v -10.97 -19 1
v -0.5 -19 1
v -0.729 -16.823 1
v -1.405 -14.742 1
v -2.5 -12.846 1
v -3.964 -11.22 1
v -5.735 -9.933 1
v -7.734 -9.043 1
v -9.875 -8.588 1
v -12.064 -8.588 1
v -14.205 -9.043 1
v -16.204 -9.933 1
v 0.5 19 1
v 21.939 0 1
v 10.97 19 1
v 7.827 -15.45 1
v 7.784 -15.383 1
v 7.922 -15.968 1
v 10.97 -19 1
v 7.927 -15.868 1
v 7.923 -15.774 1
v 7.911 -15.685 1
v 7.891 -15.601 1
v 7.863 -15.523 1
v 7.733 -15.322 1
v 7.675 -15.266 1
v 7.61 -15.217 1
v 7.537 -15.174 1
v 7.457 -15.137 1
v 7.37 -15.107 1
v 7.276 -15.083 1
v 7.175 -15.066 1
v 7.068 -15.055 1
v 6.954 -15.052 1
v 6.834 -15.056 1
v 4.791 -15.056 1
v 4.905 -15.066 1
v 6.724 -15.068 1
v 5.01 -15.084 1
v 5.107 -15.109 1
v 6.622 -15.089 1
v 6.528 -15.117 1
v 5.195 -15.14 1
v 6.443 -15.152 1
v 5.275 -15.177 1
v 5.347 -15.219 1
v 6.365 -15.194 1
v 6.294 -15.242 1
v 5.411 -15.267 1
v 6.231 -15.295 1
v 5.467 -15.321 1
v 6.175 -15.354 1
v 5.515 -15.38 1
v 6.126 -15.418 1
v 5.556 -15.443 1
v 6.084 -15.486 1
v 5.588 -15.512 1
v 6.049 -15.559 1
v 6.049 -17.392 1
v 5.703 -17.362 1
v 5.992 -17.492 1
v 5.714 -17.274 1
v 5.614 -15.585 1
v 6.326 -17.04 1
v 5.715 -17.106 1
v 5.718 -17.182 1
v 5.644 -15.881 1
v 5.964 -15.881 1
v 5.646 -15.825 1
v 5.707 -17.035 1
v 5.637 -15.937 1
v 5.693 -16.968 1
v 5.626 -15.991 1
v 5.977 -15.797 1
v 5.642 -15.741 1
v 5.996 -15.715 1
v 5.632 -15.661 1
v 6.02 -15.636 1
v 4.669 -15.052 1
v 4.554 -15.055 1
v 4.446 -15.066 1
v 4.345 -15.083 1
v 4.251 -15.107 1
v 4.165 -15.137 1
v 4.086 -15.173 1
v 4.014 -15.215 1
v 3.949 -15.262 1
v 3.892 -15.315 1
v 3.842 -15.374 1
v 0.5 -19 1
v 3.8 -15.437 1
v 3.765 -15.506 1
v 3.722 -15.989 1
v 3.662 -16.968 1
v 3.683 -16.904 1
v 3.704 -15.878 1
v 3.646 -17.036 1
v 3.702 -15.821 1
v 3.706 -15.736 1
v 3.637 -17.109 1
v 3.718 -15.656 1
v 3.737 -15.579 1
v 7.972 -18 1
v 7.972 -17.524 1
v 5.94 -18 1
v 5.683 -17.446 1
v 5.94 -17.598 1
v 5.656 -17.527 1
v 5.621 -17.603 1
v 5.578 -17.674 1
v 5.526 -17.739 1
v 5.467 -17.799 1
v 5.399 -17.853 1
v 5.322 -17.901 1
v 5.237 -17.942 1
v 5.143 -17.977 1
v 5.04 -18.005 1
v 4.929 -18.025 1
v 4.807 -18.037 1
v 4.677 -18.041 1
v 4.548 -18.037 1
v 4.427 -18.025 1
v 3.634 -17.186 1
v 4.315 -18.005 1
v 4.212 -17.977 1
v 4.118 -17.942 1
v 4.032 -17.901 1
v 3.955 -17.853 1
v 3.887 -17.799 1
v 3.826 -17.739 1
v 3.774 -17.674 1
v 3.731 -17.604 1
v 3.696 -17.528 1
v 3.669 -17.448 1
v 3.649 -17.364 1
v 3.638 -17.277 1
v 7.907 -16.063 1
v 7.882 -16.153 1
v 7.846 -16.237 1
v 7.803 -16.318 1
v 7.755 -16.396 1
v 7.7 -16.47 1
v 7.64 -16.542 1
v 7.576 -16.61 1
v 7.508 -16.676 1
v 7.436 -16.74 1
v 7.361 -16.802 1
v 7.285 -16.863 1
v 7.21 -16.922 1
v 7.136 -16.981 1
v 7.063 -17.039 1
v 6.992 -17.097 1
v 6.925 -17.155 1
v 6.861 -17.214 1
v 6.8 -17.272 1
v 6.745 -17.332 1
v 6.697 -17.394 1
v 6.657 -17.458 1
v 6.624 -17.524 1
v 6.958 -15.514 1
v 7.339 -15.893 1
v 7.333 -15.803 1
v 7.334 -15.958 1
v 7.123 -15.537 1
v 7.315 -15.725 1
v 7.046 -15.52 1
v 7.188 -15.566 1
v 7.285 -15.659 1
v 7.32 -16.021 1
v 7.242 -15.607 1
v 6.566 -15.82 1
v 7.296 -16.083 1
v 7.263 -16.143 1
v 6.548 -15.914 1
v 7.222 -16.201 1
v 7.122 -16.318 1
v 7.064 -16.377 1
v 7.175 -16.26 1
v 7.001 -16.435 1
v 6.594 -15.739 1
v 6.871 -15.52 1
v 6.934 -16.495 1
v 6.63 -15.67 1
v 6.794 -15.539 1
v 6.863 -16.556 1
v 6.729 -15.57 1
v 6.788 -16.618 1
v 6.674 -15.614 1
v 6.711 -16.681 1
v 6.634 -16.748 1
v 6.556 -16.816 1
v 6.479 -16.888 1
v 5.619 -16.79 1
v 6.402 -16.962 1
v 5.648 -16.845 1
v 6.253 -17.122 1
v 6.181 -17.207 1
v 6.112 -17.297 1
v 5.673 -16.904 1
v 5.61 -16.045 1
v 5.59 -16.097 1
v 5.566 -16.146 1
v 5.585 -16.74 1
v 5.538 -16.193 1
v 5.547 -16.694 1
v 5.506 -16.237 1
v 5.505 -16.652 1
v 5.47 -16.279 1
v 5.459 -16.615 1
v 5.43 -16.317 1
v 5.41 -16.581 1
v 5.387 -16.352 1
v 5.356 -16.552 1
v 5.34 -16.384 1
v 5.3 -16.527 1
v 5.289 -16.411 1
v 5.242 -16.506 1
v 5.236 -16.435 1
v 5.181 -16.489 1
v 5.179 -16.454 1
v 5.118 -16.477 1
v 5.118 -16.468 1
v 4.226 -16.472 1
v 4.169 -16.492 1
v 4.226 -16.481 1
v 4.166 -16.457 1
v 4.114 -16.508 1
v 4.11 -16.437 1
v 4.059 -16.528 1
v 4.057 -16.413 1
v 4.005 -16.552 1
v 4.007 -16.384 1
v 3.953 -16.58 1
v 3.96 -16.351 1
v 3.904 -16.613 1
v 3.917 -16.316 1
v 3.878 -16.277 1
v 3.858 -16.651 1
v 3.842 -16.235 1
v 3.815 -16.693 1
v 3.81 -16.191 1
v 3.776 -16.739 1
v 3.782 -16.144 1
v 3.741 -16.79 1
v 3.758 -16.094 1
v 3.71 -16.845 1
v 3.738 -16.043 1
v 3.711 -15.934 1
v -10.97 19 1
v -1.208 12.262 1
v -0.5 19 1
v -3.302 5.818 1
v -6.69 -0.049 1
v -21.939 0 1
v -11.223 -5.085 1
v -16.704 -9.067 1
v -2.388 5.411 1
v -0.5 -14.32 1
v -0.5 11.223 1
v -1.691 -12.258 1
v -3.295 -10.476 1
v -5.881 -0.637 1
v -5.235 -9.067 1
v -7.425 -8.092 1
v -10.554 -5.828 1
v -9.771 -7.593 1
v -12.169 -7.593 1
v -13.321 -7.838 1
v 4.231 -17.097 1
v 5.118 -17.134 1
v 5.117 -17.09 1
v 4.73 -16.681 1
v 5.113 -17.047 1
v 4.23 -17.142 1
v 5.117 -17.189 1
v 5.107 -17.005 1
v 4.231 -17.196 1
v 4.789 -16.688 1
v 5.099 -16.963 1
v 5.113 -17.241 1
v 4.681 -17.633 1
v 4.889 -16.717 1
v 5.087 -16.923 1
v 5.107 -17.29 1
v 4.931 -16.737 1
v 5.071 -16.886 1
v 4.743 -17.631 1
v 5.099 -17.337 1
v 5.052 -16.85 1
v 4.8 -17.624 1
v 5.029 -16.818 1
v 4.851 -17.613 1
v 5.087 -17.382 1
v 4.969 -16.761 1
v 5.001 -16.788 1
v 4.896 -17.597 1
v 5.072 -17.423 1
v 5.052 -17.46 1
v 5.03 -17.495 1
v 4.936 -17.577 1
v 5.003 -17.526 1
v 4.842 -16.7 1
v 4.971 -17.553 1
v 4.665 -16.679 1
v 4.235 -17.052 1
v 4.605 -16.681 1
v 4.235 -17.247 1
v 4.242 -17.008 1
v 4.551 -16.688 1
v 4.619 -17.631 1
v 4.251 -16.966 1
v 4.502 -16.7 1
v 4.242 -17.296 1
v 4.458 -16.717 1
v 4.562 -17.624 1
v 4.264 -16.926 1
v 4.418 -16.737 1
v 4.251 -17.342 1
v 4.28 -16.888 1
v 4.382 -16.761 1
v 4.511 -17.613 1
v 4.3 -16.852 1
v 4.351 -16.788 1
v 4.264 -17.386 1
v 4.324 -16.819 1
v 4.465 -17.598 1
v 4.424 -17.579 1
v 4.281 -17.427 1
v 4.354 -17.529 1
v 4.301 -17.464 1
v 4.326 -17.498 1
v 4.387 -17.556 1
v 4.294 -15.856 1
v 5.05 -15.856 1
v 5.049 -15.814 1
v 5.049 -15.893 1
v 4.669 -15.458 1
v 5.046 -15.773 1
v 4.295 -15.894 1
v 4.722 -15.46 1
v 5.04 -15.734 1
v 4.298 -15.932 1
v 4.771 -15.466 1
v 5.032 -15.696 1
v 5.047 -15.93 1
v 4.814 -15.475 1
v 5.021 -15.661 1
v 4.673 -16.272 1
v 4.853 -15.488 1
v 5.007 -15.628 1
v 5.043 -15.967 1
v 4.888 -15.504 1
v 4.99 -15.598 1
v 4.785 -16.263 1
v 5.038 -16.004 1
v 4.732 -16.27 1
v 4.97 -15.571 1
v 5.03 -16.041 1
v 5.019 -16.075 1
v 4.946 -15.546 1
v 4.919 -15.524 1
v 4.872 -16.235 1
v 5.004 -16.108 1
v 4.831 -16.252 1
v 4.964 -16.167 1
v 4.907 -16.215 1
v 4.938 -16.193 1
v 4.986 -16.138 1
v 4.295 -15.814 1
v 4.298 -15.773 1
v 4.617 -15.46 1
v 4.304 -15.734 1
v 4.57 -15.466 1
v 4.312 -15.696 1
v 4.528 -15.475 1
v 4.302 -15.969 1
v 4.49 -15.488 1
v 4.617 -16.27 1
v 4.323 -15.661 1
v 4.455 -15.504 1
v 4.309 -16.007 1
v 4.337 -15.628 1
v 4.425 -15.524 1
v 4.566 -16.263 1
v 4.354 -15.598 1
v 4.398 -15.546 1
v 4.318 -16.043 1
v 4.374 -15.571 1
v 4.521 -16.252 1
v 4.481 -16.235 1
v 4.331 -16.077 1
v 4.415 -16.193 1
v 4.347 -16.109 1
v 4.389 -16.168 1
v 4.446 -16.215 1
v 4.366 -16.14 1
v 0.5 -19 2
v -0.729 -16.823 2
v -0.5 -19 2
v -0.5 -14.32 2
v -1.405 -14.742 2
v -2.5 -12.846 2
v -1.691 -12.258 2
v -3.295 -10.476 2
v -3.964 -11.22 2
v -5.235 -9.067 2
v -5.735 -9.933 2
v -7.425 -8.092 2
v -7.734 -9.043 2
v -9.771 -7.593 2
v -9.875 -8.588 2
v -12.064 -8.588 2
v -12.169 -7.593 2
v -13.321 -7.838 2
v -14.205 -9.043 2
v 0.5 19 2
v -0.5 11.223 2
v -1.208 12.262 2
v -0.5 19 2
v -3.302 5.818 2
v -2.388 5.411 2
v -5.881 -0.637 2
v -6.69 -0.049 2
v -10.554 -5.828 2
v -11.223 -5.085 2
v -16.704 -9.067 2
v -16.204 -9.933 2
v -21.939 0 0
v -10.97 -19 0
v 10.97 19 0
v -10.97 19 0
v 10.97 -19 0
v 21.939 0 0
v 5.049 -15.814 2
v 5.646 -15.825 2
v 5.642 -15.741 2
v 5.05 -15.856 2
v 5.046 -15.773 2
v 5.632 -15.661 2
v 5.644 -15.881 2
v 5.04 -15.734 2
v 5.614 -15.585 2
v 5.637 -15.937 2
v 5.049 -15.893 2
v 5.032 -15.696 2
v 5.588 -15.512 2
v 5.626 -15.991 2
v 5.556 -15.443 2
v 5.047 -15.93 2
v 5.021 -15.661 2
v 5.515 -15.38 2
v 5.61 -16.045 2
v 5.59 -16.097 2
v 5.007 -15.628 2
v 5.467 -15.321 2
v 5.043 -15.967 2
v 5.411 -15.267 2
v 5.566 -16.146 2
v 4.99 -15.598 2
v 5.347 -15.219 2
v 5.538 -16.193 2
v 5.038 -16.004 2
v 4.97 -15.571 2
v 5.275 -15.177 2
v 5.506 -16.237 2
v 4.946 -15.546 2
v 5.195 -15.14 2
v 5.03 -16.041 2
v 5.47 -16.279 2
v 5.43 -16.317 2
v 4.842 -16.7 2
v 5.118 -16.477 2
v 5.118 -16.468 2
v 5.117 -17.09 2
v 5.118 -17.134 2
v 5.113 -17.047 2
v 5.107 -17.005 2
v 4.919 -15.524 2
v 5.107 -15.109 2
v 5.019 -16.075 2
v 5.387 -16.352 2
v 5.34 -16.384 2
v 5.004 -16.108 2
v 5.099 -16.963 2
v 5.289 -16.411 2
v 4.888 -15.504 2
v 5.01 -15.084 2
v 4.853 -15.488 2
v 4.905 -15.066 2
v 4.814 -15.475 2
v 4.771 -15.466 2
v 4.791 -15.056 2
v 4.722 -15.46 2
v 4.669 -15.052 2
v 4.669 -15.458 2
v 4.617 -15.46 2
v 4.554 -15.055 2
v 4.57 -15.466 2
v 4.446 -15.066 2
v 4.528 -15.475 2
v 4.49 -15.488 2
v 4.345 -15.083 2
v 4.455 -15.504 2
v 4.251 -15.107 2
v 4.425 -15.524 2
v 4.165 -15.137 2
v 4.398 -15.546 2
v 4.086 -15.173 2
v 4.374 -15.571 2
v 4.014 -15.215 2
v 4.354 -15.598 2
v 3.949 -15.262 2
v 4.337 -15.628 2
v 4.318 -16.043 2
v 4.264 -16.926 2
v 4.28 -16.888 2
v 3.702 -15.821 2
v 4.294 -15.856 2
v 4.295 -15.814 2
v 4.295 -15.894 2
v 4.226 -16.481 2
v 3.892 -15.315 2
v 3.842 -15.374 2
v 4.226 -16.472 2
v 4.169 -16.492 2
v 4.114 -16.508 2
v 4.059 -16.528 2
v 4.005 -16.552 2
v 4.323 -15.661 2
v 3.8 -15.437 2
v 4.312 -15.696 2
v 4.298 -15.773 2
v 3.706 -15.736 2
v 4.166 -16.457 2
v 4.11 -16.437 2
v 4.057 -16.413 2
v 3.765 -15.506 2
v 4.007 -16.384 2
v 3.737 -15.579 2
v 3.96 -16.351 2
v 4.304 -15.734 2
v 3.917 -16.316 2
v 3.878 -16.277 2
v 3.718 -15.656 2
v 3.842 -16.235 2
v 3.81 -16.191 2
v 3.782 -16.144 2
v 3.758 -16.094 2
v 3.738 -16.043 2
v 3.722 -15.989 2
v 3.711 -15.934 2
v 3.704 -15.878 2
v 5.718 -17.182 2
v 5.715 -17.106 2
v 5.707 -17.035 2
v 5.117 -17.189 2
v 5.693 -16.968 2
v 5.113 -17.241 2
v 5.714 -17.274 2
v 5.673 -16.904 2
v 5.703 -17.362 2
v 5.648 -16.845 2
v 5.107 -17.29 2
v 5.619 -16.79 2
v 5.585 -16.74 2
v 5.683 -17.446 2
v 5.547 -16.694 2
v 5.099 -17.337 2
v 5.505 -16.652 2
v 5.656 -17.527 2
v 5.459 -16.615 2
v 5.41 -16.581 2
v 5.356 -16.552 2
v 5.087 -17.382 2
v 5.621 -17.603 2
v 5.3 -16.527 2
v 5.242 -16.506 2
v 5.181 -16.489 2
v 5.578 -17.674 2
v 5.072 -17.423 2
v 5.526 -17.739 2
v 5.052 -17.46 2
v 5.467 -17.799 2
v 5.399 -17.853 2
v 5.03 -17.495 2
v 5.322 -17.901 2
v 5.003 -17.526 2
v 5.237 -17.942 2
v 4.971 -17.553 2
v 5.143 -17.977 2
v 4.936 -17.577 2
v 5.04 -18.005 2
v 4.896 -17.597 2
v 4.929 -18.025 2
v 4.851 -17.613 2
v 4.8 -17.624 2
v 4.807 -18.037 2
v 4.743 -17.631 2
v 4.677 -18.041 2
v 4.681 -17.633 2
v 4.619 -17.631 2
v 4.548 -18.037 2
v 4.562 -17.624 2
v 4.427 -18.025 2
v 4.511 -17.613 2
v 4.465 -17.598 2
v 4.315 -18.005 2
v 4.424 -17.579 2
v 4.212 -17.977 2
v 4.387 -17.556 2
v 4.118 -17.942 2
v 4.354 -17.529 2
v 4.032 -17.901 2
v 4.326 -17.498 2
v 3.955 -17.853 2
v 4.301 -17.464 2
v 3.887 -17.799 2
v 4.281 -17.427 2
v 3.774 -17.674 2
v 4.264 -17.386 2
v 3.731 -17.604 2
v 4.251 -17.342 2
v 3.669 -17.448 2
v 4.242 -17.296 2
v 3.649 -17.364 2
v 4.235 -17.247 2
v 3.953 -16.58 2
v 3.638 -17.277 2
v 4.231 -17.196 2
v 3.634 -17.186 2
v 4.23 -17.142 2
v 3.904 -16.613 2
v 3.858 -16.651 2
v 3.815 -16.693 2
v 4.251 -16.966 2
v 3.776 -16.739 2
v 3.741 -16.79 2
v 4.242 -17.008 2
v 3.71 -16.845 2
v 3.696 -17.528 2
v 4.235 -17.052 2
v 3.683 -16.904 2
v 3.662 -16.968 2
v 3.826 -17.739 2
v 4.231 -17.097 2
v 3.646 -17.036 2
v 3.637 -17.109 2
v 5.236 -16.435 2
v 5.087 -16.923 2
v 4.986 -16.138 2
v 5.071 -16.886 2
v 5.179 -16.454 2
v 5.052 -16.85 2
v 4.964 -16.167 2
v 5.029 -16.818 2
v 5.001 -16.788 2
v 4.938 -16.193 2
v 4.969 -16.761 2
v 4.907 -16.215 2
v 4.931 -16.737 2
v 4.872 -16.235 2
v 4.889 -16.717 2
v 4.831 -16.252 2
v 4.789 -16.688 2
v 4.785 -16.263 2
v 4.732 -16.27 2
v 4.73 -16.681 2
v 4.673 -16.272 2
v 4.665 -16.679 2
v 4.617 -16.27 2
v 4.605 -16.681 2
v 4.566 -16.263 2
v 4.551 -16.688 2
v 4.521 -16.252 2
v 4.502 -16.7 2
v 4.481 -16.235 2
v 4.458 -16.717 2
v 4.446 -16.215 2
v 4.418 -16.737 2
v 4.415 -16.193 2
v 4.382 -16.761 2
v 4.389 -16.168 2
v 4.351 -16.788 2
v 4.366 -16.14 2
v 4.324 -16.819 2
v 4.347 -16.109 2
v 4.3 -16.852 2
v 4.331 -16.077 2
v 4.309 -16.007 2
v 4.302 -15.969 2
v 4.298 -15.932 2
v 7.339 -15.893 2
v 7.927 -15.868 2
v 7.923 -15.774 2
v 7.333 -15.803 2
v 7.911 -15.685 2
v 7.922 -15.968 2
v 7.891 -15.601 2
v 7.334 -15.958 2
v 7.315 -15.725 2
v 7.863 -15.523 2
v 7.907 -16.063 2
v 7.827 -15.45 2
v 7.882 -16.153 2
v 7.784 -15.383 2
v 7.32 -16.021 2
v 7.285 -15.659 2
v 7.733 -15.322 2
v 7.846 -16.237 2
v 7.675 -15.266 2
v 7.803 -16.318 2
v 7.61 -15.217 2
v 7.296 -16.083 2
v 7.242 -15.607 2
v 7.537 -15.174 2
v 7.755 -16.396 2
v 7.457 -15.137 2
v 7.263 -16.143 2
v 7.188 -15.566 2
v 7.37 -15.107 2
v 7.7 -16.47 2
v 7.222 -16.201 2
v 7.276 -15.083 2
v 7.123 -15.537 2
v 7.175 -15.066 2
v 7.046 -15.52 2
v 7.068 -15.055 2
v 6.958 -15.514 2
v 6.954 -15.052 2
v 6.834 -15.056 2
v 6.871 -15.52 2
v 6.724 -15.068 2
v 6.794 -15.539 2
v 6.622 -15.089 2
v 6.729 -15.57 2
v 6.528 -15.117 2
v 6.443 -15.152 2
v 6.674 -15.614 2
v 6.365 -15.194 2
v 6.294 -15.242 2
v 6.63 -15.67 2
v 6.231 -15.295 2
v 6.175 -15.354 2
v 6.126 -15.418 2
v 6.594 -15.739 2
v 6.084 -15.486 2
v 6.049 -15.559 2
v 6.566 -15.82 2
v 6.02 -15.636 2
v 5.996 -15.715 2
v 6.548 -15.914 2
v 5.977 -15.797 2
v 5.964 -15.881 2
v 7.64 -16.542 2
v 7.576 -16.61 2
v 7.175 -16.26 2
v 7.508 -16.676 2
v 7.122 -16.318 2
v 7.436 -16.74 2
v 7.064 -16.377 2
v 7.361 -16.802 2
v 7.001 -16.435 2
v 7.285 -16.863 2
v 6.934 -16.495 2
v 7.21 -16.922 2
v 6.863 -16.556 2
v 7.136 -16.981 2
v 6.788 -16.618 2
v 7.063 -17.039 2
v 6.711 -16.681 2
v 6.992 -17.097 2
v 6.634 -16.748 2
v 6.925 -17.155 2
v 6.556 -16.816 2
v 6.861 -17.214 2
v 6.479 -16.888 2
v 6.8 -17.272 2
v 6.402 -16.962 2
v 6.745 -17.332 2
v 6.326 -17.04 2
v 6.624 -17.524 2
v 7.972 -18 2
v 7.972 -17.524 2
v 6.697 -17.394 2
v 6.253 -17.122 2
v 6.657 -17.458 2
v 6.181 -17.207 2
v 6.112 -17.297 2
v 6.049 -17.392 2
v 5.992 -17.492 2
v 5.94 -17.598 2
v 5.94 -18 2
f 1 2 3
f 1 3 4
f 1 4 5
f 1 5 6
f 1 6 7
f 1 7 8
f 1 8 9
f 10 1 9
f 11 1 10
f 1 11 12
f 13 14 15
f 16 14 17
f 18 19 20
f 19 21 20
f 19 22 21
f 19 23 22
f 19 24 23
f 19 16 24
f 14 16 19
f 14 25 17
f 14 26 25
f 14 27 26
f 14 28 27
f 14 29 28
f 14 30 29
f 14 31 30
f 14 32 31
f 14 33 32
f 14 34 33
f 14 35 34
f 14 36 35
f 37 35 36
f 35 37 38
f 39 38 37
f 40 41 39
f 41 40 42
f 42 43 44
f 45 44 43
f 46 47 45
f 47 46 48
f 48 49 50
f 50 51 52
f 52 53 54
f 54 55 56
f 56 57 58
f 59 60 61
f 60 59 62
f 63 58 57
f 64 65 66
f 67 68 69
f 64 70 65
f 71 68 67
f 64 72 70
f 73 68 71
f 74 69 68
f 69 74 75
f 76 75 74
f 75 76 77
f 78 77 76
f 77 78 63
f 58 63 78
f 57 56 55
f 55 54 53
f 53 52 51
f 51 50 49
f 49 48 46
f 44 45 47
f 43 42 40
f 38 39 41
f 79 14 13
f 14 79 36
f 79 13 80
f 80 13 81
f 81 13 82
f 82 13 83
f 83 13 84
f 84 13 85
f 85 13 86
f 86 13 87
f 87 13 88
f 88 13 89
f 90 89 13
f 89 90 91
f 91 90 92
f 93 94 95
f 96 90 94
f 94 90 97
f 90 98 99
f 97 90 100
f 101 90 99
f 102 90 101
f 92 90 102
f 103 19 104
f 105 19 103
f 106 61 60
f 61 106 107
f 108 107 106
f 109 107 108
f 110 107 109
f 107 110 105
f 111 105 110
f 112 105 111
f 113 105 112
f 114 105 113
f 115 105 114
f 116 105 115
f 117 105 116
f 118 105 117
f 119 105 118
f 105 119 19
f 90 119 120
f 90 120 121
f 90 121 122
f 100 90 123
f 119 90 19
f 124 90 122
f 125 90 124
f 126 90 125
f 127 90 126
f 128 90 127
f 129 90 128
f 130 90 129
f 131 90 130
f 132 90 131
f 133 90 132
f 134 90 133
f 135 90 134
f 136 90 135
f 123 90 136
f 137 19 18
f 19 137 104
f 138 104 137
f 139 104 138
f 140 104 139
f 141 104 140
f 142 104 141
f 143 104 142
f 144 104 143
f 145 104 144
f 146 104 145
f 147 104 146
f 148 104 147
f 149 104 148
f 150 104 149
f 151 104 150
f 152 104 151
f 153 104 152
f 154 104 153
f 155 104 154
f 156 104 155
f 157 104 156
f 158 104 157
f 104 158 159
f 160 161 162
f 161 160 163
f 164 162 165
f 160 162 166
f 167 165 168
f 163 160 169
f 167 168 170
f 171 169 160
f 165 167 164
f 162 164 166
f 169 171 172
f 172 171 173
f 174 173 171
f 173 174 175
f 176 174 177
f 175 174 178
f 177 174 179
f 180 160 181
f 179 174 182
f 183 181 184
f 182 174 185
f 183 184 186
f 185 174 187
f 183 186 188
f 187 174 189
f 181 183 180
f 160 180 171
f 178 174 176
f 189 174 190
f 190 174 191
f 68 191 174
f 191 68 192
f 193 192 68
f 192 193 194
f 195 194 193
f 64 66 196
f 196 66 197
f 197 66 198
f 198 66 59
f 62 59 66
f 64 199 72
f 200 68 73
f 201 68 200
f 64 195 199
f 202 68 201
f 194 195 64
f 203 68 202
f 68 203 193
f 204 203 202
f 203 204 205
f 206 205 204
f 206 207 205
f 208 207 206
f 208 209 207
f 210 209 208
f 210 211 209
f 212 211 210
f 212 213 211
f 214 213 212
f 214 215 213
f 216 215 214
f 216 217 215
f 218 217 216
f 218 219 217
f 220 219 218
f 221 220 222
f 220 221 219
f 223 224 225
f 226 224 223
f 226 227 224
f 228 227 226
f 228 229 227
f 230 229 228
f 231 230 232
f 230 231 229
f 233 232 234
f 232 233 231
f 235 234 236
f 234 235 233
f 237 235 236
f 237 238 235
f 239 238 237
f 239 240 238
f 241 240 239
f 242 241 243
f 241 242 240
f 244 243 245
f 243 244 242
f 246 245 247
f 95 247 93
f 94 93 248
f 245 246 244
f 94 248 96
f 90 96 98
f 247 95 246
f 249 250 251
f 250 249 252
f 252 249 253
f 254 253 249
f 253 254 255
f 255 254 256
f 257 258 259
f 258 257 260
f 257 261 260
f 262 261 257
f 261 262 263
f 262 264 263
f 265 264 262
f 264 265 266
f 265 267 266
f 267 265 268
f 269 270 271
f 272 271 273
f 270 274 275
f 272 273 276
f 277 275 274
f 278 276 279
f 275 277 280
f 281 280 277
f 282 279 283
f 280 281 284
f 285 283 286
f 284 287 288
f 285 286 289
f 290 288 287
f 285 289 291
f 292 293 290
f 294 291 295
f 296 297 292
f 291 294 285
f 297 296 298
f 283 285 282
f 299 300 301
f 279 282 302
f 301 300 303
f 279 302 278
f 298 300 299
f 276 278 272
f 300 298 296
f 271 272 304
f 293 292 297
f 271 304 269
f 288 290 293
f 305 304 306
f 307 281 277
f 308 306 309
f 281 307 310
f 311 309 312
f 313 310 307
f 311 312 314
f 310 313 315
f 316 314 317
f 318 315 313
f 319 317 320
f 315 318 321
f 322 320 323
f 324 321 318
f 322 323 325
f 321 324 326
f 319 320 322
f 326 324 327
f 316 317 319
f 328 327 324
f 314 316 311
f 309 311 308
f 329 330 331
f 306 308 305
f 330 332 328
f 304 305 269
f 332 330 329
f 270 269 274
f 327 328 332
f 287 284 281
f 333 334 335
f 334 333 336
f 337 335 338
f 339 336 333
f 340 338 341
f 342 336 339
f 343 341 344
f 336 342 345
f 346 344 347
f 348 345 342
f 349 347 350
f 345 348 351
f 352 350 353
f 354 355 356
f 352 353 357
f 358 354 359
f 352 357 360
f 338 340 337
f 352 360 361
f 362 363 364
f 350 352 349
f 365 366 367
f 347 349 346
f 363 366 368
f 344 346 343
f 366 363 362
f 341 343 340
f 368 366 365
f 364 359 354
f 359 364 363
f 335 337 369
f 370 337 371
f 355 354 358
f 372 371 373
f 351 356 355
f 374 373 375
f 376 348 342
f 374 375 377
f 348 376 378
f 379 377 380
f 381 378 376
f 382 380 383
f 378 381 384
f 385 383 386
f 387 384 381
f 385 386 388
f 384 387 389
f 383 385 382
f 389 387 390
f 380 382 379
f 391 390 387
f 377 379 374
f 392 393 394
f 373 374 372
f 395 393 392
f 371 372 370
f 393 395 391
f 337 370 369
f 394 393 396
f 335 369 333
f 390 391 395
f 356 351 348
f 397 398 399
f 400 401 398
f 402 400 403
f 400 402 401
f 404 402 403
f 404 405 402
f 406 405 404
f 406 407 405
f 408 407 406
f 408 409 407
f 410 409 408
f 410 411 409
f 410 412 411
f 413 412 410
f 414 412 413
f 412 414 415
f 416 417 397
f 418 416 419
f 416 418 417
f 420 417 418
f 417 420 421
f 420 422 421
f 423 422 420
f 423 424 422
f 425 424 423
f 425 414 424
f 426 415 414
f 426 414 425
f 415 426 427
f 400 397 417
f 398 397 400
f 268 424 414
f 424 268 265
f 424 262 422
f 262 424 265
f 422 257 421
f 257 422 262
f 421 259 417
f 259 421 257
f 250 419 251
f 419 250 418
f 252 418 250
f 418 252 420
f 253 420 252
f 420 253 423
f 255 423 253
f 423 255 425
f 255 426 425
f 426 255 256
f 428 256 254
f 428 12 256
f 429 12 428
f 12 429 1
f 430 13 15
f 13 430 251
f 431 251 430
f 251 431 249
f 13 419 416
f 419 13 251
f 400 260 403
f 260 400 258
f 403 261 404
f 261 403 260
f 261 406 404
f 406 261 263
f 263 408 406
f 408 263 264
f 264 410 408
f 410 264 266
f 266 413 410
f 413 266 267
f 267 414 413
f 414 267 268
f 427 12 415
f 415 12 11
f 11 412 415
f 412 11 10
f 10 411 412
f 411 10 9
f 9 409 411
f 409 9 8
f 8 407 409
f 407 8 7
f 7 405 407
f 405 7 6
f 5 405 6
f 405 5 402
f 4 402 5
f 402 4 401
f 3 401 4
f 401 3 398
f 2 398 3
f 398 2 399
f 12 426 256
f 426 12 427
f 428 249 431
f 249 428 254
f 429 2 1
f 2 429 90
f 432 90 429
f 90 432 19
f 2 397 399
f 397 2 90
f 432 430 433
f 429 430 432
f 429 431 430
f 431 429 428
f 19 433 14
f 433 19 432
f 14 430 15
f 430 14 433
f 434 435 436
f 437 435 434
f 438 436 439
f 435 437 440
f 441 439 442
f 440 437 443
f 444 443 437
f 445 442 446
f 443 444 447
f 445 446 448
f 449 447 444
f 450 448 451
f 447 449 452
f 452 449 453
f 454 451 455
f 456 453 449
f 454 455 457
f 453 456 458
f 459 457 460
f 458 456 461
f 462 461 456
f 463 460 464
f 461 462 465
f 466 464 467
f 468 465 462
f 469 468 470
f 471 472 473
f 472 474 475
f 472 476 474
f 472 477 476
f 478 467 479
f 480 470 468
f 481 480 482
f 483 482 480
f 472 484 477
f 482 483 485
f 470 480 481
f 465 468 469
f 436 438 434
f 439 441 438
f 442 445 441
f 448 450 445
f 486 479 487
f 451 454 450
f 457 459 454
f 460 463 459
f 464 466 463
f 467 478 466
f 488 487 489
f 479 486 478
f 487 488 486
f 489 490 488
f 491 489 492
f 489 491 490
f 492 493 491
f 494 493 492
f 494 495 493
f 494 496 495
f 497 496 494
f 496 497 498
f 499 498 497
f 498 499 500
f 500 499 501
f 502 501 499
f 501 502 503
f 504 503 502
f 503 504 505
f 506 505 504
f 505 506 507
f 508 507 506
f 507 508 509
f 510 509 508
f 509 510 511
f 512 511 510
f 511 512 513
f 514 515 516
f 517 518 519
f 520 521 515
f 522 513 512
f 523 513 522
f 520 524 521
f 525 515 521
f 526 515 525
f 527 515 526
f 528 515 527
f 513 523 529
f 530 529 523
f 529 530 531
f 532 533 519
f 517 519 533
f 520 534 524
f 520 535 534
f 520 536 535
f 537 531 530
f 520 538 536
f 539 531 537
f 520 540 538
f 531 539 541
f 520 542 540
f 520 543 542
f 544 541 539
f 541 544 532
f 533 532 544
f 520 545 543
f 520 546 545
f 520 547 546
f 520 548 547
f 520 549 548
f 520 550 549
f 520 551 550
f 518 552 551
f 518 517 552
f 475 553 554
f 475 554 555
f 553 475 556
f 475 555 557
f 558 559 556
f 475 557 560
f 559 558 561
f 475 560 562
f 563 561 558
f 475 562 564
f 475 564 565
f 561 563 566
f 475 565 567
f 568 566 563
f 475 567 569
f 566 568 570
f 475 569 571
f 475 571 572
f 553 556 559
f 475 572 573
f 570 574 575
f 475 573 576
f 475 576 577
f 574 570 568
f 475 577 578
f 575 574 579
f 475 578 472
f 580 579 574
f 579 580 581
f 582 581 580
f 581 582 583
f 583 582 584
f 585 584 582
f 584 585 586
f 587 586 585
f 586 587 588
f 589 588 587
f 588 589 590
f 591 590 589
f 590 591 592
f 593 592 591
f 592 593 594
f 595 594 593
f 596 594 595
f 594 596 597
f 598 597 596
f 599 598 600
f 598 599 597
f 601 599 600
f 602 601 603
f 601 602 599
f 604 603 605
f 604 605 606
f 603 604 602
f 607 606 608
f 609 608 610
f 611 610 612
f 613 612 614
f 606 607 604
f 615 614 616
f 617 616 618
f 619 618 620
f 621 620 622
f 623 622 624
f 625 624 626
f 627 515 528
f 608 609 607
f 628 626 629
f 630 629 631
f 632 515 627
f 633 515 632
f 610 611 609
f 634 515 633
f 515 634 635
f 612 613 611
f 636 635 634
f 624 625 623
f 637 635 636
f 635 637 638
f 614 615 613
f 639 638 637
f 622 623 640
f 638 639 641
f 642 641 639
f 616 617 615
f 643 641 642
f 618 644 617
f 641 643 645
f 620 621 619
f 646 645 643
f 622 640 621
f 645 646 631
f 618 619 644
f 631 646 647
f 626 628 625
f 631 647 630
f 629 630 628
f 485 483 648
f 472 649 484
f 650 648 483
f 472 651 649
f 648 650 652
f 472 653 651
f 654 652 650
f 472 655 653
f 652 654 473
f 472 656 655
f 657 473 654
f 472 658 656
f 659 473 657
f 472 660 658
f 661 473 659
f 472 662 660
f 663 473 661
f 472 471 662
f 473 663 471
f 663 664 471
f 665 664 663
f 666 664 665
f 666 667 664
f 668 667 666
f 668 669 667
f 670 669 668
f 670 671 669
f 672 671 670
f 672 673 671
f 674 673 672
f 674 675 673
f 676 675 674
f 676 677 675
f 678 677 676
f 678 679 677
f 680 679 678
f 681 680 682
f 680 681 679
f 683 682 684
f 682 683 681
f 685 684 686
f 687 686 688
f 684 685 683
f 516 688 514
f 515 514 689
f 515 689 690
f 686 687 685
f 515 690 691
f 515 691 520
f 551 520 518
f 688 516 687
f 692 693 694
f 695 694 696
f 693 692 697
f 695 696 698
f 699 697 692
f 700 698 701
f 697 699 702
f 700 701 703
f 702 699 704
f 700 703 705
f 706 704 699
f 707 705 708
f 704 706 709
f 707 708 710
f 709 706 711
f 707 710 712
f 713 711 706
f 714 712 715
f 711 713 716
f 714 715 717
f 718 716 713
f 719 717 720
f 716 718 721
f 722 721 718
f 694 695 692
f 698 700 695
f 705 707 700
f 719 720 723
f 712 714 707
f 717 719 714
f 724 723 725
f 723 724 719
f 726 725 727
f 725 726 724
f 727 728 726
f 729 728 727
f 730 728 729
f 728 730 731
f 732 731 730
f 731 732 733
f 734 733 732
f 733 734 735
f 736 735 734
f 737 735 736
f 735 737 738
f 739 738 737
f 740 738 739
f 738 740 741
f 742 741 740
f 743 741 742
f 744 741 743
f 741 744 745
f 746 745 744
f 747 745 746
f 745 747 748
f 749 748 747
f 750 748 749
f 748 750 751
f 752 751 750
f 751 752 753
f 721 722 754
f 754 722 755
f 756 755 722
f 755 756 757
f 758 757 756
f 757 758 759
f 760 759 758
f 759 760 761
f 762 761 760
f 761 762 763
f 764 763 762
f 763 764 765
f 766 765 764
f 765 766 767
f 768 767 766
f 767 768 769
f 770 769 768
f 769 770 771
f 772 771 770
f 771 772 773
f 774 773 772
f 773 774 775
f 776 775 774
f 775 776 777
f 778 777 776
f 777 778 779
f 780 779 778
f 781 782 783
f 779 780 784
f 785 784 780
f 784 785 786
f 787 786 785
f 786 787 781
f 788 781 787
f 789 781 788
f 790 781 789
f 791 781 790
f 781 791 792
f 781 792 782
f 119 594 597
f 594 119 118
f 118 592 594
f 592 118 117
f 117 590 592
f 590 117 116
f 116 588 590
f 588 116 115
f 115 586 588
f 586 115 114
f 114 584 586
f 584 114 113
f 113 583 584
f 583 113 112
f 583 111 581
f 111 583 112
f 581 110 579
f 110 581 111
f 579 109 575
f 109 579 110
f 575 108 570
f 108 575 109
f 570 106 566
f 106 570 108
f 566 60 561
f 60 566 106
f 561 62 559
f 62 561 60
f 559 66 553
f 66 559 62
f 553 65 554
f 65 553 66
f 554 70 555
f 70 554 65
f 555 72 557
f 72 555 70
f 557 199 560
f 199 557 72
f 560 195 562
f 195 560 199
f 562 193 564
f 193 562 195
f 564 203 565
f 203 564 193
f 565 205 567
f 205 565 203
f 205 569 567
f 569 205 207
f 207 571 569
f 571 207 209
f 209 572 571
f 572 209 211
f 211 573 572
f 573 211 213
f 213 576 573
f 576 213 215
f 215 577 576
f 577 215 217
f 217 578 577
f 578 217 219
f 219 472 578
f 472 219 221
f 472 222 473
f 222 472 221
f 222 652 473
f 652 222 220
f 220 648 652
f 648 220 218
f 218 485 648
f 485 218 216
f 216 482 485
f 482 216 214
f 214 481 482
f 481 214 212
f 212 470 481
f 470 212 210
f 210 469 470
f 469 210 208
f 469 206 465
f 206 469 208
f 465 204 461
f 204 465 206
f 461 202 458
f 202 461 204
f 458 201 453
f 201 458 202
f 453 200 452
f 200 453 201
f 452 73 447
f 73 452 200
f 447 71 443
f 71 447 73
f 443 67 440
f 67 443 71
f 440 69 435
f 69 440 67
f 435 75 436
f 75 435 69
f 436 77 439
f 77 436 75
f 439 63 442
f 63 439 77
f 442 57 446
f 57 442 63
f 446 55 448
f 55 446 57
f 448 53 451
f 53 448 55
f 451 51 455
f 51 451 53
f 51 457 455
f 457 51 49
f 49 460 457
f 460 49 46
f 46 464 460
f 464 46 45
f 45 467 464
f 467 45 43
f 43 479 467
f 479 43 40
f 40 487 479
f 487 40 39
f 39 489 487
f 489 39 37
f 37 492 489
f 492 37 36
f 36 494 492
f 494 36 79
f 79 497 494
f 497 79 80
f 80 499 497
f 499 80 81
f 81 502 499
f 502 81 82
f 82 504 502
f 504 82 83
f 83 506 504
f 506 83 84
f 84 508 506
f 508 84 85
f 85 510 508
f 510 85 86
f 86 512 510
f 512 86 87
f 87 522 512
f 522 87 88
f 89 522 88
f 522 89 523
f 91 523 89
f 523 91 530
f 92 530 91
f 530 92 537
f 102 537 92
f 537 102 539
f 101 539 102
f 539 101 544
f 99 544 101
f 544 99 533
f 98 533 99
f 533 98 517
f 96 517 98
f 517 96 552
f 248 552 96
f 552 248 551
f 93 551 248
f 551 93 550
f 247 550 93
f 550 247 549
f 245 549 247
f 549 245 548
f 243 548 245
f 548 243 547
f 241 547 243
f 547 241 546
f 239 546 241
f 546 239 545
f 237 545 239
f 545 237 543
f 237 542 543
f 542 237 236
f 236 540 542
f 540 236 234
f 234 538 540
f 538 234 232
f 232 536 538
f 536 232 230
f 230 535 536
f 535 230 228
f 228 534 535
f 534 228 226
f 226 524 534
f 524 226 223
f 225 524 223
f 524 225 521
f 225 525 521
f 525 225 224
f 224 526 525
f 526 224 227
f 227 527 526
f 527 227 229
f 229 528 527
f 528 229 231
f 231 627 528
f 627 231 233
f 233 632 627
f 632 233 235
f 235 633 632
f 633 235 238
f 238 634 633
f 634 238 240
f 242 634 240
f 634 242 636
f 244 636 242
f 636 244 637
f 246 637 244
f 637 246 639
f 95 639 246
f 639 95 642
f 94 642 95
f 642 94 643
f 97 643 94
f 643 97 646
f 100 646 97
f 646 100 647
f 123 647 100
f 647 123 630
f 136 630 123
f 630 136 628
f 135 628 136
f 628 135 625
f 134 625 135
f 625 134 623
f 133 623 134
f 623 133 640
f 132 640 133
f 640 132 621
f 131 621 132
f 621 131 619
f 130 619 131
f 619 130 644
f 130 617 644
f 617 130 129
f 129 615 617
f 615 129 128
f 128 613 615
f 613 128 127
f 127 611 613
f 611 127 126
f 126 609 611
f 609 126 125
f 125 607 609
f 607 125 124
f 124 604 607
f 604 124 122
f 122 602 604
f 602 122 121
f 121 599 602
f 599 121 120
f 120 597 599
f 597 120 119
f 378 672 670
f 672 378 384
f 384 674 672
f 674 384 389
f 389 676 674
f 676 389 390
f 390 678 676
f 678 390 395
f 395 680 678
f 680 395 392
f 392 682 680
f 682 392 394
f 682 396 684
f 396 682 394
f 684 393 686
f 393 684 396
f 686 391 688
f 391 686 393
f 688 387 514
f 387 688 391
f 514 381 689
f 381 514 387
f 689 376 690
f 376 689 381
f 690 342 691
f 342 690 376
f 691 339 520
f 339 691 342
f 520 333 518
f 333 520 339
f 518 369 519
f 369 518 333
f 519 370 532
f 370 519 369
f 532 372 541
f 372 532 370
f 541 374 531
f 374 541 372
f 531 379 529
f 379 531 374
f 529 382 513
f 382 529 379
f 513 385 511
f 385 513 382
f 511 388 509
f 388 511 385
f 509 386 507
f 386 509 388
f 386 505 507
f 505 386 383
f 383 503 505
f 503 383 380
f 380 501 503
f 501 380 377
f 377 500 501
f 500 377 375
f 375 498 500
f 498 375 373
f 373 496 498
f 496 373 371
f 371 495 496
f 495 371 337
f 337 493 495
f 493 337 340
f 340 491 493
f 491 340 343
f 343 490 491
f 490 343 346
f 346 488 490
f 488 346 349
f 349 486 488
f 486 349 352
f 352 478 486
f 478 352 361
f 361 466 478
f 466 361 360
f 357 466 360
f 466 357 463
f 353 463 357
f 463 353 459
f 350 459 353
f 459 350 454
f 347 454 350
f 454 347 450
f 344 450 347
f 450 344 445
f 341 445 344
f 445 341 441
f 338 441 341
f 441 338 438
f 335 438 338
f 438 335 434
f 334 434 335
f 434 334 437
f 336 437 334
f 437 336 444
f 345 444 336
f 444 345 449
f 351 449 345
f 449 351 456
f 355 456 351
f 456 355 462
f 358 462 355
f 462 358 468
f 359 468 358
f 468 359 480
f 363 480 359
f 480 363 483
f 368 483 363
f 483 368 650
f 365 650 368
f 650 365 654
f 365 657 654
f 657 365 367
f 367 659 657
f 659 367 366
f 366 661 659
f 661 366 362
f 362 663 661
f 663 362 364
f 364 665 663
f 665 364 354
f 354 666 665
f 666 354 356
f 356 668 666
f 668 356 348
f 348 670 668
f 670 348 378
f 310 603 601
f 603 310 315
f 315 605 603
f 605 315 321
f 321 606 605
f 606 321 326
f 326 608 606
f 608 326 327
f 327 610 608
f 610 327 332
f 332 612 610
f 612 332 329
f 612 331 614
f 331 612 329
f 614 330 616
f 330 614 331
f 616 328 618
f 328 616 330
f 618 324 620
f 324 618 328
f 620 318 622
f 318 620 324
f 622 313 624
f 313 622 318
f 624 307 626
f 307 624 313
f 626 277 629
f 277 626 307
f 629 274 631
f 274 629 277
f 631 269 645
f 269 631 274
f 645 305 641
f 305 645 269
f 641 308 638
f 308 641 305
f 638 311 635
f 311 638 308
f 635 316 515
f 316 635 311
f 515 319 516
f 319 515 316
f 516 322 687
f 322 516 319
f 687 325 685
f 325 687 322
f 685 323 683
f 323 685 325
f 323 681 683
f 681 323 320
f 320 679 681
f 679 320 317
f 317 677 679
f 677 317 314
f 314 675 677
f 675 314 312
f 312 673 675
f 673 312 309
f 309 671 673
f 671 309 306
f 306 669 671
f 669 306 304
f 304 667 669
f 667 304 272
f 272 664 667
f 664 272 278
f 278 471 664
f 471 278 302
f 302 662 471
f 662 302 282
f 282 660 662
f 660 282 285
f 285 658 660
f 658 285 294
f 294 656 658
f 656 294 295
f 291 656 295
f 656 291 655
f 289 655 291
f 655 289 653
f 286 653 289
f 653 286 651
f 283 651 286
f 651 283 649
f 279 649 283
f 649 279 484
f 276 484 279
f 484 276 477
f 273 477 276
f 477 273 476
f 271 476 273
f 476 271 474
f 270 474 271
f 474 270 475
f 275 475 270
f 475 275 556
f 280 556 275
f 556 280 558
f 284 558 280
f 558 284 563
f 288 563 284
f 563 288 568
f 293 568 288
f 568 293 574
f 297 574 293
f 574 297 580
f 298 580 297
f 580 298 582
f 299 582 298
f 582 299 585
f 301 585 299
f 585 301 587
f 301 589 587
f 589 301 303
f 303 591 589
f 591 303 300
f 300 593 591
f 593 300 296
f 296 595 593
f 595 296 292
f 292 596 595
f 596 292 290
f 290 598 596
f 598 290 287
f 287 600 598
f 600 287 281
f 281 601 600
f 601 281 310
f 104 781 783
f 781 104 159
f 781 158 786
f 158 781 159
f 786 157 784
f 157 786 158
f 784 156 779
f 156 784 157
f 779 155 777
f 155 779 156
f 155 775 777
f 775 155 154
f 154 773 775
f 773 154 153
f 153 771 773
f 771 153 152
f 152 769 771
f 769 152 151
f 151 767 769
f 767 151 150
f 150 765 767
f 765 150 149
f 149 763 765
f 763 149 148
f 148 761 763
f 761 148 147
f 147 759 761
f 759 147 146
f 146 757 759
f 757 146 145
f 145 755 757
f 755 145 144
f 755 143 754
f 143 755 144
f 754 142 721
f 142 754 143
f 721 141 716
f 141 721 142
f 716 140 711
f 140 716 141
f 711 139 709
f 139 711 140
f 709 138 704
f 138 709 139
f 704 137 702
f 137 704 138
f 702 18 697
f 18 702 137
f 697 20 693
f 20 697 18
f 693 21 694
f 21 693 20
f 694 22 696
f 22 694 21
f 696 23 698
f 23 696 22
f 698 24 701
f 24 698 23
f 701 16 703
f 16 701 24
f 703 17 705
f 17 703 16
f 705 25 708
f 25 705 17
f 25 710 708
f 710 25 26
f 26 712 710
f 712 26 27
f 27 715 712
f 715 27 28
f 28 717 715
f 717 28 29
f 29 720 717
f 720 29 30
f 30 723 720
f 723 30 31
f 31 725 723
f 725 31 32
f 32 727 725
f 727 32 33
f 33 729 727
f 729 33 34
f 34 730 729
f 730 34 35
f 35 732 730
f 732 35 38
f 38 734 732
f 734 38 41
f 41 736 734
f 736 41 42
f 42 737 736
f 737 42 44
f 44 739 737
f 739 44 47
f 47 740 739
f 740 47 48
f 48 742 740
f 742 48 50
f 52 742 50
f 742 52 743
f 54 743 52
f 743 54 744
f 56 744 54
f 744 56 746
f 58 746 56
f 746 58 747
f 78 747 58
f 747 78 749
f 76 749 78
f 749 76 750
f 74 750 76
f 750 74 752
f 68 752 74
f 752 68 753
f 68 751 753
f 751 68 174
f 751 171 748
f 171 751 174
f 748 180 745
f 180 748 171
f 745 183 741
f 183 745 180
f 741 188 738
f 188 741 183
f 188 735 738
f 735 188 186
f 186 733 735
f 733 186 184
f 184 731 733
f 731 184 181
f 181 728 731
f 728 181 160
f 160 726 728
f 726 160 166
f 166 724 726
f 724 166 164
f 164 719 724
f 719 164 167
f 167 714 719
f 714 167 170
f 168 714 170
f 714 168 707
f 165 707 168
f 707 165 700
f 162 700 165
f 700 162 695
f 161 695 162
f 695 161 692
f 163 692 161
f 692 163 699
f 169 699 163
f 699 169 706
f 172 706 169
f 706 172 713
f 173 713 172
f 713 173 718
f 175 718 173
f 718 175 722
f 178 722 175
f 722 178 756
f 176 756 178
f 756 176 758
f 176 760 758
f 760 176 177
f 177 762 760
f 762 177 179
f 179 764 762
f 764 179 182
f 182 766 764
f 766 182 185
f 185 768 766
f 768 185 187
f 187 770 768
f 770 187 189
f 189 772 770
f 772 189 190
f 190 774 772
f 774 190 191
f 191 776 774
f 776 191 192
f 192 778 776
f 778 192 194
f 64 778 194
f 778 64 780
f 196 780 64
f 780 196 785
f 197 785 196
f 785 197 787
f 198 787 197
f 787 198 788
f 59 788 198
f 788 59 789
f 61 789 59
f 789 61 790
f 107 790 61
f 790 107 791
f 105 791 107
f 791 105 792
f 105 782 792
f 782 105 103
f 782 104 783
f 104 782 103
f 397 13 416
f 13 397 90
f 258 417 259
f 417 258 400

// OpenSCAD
include <../Scripts/18xx tiles basic functions.scad>
hex("Green");
put_tilenr("82");
light_curve(r=3);
sharp_curve(r=5);
straight_line(r=3);
